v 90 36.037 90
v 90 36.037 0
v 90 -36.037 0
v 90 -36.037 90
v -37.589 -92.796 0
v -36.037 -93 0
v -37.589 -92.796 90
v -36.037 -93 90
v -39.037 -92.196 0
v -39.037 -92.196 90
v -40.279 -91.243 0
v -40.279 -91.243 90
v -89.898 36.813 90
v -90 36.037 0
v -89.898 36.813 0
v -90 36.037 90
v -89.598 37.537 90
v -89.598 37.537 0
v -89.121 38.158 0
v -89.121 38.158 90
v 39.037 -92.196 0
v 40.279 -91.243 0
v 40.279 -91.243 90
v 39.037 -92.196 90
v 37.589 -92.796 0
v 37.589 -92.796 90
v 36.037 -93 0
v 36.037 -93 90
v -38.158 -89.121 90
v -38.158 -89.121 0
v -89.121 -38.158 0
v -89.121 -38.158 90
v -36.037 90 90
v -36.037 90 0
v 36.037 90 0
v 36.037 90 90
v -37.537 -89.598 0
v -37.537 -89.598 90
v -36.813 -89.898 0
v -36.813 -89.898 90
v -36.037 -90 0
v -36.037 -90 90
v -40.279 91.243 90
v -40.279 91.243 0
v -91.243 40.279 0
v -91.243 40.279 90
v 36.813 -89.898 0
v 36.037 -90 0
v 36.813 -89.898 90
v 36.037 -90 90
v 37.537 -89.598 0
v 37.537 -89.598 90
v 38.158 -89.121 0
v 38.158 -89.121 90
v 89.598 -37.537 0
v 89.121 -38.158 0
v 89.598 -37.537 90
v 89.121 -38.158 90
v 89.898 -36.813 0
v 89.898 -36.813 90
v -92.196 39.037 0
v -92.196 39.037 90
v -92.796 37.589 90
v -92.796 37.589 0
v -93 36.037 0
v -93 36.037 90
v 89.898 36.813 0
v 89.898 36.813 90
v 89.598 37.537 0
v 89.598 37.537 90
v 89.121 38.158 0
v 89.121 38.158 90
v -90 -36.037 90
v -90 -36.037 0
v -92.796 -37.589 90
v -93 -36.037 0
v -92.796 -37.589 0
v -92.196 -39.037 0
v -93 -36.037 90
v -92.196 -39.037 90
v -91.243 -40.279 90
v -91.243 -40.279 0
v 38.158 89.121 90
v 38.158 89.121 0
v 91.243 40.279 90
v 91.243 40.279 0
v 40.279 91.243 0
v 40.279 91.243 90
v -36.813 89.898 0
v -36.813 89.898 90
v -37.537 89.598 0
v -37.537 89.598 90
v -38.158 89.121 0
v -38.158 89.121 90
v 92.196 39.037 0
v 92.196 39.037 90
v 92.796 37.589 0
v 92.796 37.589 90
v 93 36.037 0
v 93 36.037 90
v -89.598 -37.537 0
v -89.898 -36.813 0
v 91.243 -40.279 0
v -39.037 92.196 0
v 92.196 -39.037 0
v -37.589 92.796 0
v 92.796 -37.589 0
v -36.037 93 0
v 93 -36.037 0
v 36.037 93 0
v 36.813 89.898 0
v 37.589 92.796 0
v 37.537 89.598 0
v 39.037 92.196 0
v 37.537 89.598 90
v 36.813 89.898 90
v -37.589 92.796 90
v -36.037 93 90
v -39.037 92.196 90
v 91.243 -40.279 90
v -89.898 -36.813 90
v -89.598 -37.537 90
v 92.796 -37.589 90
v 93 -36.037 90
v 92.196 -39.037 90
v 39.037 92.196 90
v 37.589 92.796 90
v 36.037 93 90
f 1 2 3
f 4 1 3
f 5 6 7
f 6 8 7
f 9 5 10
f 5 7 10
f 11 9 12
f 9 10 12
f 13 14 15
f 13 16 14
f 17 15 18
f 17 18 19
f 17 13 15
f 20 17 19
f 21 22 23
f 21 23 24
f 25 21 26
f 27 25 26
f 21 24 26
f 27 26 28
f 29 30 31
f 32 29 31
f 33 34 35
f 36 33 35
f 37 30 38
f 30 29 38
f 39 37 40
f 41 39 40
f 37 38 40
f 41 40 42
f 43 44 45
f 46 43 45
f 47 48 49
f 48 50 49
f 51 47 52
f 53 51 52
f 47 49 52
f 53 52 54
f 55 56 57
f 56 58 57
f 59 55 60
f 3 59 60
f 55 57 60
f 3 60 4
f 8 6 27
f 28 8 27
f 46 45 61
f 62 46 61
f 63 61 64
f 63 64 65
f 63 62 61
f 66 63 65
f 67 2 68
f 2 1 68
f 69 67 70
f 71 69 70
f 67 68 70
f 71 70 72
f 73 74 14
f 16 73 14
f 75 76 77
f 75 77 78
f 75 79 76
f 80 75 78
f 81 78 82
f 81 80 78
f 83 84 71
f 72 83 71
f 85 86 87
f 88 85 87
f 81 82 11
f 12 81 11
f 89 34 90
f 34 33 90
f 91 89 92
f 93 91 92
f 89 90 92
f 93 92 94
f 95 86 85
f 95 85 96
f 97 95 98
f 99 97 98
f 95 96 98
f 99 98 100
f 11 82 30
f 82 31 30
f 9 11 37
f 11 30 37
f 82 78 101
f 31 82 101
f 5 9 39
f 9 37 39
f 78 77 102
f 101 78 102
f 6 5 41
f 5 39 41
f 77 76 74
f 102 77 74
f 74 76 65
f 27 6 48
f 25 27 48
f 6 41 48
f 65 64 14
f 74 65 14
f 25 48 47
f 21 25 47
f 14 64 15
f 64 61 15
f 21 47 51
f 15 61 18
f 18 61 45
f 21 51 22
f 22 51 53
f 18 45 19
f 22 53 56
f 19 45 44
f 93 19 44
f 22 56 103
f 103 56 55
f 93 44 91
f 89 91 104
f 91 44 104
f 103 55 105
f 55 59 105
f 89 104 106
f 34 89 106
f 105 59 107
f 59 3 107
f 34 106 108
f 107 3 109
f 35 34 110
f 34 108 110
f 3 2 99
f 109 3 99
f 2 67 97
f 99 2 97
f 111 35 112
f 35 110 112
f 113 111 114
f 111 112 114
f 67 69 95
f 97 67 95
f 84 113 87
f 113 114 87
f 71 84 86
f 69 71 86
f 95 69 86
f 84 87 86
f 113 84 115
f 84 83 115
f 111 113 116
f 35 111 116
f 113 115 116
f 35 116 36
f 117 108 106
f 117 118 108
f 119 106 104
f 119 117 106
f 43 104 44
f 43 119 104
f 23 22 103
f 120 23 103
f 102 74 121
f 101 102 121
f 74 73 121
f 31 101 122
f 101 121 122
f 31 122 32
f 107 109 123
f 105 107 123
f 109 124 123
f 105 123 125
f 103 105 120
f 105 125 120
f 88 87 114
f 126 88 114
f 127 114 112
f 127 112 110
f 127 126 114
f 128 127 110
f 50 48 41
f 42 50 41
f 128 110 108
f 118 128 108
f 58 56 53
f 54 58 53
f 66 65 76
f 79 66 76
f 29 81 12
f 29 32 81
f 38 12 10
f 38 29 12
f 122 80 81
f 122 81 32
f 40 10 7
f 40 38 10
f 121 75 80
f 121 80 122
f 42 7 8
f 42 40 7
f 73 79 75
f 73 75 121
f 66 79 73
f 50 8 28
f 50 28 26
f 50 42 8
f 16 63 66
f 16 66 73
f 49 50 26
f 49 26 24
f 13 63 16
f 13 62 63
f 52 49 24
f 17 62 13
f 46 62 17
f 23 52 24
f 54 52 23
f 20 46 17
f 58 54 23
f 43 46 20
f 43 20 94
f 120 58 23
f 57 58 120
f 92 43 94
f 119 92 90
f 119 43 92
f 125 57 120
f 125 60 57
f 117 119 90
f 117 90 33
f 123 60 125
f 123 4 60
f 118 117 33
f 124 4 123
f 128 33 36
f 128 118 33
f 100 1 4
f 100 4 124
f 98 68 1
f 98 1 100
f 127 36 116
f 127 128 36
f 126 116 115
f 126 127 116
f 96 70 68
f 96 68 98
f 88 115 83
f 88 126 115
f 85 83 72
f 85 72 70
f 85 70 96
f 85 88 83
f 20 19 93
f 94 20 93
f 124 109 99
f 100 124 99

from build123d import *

# Parameters (mm, degrees)
F1_DEPTH = 90
F2_R     = 3
F3_R     = 6


with BuildPart() as f1:
    # F0 (on Top) → F1 (new body)
    with BuildSketch(Plane.XY):
        Polygon((93, 38.521861), (38.521861, 93), (-38.521861, 93), (-93, 38.521861), (-93, -38.521861), (-38.521861, -93), (38.521861, -93), (93, -38.521861), align=None)
        Polygon((-90, 37.279221), (-37.279221, 90), (37.279221, 90), (90, 37.279221), (90, -37.279221), (37.279221, -90), (-37.279221, -90), (-90, -37.279221), align=None, mode=Mode.SUBTRACT)
    extrude(amount=F1_DEPTH)

    # F2
    f2_edges = [f1.edges().sort_by_distance(p)[0] for p in [
        (-37.279221, 90, 45),
        (37.279221, 90, 45),
        (90, 37.279221, 45),
        (90, -37.279221, 45),
        (37.279221, -90, 45),
        (-37.279221, -90, 45),
        (-90, -37.279221, 45),
        (-90, 37.279221, 45),
    ]]
    fillet(f2_edges, radius=F2_R)

    # F3
    f3_edges = [f1.edges().sort_by_distance(p)[0] for p in [
        (-93, -38.521861, 45),
        (-38.521861, -93, 45),
        (38.521861, -93, 45),
        (93, -38.521861, 45),
        (93, 38.521861, 45),
        (38.521861, 93, 45),
        (-38.521861, 93, 45),
        (-93, 38.521861, 45),
    ]]
    fillet(f3_edges, radius=F3_R)


solid = f1.part
